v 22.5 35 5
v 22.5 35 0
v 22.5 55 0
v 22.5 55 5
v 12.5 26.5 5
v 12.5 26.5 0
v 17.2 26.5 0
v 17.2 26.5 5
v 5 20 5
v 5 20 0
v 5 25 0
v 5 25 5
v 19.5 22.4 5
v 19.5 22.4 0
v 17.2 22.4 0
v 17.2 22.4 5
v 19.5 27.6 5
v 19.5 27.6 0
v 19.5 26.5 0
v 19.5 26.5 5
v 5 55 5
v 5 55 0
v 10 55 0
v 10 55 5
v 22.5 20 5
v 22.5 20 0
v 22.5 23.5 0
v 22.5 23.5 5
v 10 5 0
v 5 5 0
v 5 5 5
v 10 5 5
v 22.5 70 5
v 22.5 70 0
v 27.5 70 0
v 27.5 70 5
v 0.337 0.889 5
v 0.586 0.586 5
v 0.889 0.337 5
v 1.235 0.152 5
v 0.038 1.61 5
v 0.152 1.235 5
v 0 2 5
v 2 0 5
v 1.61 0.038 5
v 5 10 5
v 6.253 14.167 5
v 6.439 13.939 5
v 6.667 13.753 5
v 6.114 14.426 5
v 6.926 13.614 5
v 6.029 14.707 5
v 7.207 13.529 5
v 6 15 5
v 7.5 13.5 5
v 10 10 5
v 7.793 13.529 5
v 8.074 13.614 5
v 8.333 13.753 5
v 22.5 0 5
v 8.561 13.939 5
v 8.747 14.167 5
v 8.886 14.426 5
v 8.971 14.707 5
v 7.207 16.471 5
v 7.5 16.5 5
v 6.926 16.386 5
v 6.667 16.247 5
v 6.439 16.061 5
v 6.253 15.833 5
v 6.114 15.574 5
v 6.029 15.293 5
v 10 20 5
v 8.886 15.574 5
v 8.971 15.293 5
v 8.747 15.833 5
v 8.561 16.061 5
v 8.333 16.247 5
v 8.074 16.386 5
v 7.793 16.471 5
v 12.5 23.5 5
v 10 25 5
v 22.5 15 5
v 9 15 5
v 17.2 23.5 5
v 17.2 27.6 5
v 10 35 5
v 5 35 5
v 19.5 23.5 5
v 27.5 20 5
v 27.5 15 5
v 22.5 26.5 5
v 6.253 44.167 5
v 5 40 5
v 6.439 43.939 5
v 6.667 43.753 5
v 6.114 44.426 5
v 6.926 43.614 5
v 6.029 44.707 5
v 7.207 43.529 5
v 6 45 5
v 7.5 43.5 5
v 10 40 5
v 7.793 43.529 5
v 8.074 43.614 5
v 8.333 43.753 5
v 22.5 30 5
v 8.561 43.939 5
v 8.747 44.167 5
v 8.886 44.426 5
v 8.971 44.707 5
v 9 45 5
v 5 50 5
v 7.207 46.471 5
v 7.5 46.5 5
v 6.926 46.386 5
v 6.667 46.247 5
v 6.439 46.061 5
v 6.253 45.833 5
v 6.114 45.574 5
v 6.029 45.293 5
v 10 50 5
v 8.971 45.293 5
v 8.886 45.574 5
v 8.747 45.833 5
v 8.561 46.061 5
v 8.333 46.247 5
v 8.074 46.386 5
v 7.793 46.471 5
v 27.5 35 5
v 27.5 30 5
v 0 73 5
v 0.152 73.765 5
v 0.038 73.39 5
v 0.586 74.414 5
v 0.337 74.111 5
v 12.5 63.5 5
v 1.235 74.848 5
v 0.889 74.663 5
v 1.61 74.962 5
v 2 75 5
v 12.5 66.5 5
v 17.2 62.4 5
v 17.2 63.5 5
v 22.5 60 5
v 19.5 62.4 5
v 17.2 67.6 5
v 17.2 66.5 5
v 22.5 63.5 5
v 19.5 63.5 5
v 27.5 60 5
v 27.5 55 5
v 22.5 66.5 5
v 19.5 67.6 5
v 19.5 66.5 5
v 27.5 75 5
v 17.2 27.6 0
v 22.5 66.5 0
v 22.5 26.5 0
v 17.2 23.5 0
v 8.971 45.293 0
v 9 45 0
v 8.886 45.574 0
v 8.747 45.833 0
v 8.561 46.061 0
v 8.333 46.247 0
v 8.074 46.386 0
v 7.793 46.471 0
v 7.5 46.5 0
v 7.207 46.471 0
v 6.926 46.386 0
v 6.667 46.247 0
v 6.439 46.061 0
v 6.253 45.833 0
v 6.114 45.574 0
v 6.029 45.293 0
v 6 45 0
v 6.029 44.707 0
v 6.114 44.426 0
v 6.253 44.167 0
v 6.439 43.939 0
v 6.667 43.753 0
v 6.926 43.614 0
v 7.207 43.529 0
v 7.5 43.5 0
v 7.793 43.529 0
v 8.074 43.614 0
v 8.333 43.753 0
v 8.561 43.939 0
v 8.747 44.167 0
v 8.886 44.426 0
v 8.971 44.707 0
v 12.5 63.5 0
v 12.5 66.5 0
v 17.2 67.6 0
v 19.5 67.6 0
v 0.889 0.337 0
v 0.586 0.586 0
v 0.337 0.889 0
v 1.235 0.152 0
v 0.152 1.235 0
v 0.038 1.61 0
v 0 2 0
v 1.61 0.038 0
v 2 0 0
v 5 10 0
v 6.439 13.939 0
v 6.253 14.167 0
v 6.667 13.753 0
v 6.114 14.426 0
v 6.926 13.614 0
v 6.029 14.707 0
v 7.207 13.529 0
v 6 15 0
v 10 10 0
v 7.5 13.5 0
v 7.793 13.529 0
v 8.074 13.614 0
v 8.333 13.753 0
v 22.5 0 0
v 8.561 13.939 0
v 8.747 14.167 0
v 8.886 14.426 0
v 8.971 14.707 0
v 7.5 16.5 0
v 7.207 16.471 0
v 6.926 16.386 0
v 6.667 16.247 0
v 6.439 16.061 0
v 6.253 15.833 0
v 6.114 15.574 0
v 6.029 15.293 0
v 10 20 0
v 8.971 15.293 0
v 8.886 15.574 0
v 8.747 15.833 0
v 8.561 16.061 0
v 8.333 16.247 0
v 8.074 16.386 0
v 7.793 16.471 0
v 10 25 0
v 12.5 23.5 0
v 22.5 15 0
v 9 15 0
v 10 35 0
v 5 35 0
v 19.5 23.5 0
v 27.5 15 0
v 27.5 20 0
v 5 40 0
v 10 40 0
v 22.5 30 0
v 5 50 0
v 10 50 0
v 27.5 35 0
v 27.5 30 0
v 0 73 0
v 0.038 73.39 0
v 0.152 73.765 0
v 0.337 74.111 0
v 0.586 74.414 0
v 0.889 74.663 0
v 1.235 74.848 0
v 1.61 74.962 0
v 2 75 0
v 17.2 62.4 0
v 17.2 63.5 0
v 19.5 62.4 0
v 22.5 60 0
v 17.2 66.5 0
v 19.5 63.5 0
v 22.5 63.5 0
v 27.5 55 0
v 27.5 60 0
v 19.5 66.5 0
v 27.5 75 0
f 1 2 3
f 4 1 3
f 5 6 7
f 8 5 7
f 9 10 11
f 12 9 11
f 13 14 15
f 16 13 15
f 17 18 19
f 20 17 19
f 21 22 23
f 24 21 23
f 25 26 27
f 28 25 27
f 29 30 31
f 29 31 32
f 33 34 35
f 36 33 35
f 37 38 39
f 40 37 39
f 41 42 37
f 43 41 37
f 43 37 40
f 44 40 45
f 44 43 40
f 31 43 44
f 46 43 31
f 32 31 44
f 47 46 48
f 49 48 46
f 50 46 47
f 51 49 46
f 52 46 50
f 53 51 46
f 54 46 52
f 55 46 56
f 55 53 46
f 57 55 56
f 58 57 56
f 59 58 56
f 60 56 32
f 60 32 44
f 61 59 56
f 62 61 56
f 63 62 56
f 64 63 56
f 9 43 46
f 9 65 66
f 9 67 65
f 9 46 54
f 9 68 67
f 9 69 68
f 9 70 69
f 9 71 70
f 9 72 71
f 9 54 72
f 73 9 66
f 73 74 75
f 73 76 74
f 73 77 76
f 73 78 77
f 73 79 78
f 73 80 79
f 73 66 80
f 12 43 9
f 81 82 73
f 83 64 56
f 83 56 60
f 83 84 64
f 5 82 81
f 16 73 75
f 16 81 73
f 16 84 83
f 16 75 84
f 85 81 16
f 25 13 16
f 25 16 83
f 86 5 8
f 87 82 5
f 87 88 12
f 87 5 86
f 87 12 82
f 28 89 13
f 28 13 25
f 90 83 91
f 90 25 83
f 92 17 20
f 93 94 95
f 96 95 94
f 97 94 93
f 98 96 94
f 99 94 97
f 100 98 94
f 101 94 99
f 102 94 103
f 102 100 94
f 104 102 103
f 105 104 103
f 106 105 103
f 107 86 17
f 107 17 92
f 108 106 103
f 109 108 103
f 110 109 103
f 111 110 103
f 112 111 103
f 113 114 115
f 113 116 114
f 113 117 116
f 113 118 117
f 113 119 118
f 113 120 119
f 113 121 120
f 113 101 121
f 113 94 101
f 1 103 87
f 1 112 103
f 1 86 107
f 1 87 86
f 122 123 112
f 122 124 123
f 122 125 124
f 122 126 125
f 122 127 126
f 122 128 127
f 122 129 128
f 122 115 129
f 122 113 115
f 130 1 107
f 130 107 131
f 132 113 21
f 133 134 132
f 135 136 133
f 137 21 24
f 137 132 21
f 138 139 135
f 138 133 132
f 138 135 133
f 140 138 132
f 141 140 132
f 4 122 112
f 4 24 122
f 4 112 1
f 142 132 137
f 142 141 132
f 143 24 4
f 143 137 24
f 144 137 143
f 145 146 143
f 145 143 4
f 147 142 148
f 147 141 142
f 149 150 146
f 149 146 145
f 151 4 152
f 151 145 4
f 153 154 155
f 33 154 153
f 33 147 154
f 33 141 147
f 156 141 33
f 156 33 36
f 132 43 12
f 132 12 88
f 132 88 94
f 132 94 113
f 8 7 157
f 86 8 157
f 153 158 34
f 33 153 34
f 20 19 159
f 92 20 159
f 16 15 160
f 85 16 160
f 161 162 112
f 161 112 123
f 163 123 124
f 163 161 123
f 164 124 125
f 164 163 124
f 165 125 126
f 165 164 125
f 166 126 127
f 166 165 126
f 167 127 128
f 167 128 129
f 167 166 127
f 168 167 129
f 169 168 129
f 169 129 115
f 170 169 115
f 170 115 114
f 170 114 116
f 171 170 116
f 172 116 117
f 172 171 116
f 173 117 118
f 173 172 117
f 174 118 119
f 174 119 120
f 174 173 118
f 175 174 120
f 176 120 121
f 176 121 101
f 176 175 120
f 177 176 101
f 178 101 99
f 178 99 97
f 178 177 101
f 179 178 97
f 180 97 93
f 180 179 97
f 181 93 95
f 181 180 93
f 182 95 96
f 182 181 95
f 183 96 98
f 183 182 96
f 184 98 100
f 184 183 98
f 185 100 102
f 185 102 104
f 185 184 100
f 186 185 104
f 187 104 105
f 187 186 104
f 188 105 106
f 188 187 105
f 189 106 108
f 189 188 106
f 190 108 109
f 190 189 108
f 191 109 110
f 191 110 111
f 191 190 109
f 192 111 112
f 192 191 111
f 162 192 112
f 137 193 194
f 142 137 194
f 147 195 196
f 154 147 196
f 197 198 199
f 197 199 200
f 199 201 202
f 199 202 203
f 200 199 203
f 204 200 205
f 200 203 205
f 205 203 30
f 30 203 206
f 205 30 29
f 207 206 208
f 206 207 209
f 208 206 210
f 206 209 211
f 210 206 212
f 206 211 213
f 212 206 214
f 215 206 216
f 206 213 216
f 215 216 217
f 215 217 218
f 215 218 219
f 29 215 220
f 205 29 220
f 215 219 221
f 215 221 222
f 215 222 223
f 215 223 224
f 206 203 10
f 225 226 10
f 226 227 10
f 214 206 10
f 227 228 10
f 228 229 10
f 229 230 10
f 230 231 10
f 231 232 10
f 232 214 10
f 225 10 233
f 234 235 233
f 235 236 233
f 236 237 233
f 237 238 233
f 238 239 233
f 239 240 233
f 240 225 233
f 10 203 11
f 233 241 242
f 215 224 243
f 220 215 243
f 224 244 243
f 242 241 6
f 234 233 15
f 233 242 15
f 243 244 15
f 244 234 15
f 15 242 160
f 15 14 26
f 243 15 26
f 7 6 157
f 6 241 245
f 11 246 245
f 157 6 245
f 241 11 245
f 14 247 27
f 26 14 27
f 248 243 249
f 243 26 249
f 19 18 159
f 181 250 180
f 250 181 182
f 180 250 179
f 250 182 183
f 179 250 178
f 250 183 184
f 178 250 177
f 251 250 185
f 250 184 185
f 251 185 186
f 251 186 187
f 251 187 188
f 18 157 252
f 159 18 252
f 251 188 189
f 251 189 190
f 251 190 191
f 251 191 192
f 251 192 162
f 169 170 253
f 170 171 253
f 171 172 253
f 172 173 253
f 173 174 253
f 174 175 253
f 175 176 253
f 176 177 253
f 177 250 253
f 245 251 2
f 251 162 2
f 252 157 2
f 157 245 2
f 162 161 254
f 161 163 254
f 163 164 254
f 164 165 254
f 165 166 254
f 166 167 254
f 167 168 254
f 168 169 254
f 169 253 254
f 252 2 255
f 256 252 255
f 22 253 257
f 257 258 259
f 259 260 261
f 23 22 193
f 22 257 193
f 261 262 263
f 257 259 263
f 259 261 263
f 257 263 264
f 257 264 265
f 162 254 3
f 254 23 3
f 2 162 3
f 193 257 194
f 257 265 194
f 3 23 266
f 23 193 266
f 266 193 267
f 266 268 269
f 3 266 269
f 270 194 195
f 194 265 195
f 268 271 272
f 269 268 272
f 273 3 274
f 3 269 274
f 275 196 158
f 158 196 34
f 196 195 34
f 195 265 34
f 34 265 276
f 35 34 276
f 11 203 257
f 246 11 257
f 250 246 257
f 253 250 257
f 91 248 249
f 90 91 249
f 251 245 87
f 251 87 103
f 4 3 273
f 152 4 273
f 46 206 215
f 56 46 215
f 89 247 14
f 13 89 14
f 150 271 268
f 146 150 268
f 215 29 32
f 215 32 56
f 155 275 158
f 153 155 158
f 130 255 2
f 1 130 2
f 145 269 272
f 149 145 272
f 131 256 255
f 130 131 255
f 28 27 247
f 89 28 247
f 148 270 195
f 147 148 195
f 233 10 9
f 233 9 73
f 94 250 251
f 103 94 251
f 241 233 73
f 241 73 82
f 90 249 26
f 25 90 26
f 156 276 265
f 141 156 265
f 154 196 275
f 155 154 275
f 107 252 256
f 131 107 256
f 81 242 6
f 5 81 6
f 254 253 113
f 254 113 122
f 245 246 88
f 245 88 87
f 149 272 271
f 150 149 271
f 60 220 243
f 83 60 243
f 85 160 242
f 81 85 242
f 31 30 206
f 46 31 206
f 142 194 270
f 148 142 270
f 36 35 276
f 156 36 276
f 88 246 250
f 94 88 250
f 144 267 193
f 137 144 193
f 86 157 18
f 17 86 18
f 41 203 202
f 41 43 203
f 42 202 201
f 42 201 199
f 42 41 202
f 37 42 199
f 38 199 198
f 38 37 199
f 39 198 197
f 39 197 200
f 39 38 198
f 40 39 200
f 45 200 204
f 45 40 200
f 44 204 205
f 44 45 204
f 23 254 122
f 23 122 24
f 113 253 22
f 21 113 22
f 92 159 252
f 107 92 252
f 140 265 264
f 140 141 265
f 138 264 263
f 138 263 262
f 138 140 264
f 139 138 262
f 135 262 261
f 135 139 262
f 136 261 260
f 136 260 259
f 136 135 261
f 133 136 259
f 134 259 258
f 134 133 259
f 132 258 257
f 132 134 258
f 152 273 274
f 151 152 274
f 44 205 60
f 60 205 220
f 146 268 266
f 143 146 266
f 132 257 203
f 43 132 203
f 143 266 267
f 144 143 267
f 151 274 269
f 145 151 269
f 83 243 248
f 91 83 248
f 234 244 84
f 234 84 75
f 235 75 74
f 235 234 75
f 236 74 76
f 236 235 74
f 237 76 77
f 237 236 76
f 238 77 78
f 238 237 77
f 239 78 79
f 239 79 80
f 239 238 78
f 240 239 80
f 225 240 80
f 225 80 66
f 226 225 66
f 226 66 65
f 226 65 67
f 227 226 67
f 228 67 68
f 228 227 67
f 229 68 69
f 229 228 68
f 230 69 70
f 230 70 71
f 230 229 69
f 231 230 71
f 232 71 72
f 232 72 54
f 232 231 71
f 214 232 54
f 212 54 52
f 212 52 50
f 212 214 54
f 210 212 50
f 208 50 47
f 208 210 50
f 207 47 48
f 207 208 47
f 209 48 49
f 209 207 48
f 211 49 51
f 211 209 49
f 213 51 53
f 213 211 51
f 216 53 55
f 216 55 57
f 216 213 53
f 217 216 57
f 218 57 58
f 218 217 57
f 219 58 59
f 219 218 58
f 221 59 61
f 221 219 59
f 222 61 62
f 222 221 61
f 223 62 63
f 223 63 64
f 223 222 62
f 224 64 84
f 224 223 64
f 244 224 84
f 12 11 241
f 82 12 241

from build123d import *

# Parameters (mm, degrees)
SKETCH1_W           = 5
SKETCH1_H           = 5
SKETCH1_R           = 1.5
BOSS_EXTRUDE1_DEPTH = 5
CONG_1_R            = 2


with BuildPart() as part:
    # Sketch1 → Boss-Extrude1 (new body)
    with BuildSketch(Plane.XY):
        Polygon((22.5, 35), (22.5, 55), (27.5, 55), (27.5, 60), (22.5, 60), (22.5, 63.5), (19.5, 63.5), (19.5, 62.4), (17.2, 62.4), (17.2, 63.5), (12.5, 63.5), (12.5, 66.5), (17.2, 66.5), (17.2, 67.6), (19.5, 67.6), (19.5, 66.5), (22.5, 66.5), (22.5, 70), (27.5, 70), (27.5, 75), (22.5, 75), (0, 75), (0, 0), (22.5, 0), (22.5, 15), (27.5, 15), (27.5, 20), (22.5, 20), (22.5, 23.5), (19.5, 23.5), (19.5, 22.4), (17.2, 22.4), (17.2, 23.5), (12.5, 23.5), (12.5, 26.5), (17.2, 26.5), (17.2, 27.6), (19.5, 27.6), (19.5, 26.5), (22.5, 26.5), (22.5, 30), (27.5, 30), (27.5, 35), align=None)
        with Locations((7.5, 7.5)):
            Rectangle(SKETCH1_W, SKETCH1_H, mode=Mode.SUBTRACT)
        with Locations((7.5, 15)):
            Circle(SKETCH1_R, mode=Mode.SUBTRACT)
        with Locations((7.5, 22.5)):
            Rectangle(SKETCH1_W, SKETCH1_H, mode=Mode.SUBTRACT)
        with Locations((7.5, 37.5)):
            Rectangle(SKETCH1_W, SKETCH1_H, mode=Mode.SUBTRACT)
        with Locations((7.5, 45)):
            Circle(SKETCH1_R, mode=Mode.SUBTRACT)
        with Locations((7.5, 52.5)):
            Rectangle(SKETCH1_W, SKETCH1_H, mode=Mode.SUBTRACT)
    extrude(amount=BOSS_EXTRUDE1_DEPTH)

    # Congé1
    cong_1_edges = [part.edges().sort_by_distance(p)[0] for p in [
        (0, 0, 2.5),
        (0, 75, 2.5),
    ]]
    fillet(cong_1_edges, radius=CONG_1_R)


solid = part.part
